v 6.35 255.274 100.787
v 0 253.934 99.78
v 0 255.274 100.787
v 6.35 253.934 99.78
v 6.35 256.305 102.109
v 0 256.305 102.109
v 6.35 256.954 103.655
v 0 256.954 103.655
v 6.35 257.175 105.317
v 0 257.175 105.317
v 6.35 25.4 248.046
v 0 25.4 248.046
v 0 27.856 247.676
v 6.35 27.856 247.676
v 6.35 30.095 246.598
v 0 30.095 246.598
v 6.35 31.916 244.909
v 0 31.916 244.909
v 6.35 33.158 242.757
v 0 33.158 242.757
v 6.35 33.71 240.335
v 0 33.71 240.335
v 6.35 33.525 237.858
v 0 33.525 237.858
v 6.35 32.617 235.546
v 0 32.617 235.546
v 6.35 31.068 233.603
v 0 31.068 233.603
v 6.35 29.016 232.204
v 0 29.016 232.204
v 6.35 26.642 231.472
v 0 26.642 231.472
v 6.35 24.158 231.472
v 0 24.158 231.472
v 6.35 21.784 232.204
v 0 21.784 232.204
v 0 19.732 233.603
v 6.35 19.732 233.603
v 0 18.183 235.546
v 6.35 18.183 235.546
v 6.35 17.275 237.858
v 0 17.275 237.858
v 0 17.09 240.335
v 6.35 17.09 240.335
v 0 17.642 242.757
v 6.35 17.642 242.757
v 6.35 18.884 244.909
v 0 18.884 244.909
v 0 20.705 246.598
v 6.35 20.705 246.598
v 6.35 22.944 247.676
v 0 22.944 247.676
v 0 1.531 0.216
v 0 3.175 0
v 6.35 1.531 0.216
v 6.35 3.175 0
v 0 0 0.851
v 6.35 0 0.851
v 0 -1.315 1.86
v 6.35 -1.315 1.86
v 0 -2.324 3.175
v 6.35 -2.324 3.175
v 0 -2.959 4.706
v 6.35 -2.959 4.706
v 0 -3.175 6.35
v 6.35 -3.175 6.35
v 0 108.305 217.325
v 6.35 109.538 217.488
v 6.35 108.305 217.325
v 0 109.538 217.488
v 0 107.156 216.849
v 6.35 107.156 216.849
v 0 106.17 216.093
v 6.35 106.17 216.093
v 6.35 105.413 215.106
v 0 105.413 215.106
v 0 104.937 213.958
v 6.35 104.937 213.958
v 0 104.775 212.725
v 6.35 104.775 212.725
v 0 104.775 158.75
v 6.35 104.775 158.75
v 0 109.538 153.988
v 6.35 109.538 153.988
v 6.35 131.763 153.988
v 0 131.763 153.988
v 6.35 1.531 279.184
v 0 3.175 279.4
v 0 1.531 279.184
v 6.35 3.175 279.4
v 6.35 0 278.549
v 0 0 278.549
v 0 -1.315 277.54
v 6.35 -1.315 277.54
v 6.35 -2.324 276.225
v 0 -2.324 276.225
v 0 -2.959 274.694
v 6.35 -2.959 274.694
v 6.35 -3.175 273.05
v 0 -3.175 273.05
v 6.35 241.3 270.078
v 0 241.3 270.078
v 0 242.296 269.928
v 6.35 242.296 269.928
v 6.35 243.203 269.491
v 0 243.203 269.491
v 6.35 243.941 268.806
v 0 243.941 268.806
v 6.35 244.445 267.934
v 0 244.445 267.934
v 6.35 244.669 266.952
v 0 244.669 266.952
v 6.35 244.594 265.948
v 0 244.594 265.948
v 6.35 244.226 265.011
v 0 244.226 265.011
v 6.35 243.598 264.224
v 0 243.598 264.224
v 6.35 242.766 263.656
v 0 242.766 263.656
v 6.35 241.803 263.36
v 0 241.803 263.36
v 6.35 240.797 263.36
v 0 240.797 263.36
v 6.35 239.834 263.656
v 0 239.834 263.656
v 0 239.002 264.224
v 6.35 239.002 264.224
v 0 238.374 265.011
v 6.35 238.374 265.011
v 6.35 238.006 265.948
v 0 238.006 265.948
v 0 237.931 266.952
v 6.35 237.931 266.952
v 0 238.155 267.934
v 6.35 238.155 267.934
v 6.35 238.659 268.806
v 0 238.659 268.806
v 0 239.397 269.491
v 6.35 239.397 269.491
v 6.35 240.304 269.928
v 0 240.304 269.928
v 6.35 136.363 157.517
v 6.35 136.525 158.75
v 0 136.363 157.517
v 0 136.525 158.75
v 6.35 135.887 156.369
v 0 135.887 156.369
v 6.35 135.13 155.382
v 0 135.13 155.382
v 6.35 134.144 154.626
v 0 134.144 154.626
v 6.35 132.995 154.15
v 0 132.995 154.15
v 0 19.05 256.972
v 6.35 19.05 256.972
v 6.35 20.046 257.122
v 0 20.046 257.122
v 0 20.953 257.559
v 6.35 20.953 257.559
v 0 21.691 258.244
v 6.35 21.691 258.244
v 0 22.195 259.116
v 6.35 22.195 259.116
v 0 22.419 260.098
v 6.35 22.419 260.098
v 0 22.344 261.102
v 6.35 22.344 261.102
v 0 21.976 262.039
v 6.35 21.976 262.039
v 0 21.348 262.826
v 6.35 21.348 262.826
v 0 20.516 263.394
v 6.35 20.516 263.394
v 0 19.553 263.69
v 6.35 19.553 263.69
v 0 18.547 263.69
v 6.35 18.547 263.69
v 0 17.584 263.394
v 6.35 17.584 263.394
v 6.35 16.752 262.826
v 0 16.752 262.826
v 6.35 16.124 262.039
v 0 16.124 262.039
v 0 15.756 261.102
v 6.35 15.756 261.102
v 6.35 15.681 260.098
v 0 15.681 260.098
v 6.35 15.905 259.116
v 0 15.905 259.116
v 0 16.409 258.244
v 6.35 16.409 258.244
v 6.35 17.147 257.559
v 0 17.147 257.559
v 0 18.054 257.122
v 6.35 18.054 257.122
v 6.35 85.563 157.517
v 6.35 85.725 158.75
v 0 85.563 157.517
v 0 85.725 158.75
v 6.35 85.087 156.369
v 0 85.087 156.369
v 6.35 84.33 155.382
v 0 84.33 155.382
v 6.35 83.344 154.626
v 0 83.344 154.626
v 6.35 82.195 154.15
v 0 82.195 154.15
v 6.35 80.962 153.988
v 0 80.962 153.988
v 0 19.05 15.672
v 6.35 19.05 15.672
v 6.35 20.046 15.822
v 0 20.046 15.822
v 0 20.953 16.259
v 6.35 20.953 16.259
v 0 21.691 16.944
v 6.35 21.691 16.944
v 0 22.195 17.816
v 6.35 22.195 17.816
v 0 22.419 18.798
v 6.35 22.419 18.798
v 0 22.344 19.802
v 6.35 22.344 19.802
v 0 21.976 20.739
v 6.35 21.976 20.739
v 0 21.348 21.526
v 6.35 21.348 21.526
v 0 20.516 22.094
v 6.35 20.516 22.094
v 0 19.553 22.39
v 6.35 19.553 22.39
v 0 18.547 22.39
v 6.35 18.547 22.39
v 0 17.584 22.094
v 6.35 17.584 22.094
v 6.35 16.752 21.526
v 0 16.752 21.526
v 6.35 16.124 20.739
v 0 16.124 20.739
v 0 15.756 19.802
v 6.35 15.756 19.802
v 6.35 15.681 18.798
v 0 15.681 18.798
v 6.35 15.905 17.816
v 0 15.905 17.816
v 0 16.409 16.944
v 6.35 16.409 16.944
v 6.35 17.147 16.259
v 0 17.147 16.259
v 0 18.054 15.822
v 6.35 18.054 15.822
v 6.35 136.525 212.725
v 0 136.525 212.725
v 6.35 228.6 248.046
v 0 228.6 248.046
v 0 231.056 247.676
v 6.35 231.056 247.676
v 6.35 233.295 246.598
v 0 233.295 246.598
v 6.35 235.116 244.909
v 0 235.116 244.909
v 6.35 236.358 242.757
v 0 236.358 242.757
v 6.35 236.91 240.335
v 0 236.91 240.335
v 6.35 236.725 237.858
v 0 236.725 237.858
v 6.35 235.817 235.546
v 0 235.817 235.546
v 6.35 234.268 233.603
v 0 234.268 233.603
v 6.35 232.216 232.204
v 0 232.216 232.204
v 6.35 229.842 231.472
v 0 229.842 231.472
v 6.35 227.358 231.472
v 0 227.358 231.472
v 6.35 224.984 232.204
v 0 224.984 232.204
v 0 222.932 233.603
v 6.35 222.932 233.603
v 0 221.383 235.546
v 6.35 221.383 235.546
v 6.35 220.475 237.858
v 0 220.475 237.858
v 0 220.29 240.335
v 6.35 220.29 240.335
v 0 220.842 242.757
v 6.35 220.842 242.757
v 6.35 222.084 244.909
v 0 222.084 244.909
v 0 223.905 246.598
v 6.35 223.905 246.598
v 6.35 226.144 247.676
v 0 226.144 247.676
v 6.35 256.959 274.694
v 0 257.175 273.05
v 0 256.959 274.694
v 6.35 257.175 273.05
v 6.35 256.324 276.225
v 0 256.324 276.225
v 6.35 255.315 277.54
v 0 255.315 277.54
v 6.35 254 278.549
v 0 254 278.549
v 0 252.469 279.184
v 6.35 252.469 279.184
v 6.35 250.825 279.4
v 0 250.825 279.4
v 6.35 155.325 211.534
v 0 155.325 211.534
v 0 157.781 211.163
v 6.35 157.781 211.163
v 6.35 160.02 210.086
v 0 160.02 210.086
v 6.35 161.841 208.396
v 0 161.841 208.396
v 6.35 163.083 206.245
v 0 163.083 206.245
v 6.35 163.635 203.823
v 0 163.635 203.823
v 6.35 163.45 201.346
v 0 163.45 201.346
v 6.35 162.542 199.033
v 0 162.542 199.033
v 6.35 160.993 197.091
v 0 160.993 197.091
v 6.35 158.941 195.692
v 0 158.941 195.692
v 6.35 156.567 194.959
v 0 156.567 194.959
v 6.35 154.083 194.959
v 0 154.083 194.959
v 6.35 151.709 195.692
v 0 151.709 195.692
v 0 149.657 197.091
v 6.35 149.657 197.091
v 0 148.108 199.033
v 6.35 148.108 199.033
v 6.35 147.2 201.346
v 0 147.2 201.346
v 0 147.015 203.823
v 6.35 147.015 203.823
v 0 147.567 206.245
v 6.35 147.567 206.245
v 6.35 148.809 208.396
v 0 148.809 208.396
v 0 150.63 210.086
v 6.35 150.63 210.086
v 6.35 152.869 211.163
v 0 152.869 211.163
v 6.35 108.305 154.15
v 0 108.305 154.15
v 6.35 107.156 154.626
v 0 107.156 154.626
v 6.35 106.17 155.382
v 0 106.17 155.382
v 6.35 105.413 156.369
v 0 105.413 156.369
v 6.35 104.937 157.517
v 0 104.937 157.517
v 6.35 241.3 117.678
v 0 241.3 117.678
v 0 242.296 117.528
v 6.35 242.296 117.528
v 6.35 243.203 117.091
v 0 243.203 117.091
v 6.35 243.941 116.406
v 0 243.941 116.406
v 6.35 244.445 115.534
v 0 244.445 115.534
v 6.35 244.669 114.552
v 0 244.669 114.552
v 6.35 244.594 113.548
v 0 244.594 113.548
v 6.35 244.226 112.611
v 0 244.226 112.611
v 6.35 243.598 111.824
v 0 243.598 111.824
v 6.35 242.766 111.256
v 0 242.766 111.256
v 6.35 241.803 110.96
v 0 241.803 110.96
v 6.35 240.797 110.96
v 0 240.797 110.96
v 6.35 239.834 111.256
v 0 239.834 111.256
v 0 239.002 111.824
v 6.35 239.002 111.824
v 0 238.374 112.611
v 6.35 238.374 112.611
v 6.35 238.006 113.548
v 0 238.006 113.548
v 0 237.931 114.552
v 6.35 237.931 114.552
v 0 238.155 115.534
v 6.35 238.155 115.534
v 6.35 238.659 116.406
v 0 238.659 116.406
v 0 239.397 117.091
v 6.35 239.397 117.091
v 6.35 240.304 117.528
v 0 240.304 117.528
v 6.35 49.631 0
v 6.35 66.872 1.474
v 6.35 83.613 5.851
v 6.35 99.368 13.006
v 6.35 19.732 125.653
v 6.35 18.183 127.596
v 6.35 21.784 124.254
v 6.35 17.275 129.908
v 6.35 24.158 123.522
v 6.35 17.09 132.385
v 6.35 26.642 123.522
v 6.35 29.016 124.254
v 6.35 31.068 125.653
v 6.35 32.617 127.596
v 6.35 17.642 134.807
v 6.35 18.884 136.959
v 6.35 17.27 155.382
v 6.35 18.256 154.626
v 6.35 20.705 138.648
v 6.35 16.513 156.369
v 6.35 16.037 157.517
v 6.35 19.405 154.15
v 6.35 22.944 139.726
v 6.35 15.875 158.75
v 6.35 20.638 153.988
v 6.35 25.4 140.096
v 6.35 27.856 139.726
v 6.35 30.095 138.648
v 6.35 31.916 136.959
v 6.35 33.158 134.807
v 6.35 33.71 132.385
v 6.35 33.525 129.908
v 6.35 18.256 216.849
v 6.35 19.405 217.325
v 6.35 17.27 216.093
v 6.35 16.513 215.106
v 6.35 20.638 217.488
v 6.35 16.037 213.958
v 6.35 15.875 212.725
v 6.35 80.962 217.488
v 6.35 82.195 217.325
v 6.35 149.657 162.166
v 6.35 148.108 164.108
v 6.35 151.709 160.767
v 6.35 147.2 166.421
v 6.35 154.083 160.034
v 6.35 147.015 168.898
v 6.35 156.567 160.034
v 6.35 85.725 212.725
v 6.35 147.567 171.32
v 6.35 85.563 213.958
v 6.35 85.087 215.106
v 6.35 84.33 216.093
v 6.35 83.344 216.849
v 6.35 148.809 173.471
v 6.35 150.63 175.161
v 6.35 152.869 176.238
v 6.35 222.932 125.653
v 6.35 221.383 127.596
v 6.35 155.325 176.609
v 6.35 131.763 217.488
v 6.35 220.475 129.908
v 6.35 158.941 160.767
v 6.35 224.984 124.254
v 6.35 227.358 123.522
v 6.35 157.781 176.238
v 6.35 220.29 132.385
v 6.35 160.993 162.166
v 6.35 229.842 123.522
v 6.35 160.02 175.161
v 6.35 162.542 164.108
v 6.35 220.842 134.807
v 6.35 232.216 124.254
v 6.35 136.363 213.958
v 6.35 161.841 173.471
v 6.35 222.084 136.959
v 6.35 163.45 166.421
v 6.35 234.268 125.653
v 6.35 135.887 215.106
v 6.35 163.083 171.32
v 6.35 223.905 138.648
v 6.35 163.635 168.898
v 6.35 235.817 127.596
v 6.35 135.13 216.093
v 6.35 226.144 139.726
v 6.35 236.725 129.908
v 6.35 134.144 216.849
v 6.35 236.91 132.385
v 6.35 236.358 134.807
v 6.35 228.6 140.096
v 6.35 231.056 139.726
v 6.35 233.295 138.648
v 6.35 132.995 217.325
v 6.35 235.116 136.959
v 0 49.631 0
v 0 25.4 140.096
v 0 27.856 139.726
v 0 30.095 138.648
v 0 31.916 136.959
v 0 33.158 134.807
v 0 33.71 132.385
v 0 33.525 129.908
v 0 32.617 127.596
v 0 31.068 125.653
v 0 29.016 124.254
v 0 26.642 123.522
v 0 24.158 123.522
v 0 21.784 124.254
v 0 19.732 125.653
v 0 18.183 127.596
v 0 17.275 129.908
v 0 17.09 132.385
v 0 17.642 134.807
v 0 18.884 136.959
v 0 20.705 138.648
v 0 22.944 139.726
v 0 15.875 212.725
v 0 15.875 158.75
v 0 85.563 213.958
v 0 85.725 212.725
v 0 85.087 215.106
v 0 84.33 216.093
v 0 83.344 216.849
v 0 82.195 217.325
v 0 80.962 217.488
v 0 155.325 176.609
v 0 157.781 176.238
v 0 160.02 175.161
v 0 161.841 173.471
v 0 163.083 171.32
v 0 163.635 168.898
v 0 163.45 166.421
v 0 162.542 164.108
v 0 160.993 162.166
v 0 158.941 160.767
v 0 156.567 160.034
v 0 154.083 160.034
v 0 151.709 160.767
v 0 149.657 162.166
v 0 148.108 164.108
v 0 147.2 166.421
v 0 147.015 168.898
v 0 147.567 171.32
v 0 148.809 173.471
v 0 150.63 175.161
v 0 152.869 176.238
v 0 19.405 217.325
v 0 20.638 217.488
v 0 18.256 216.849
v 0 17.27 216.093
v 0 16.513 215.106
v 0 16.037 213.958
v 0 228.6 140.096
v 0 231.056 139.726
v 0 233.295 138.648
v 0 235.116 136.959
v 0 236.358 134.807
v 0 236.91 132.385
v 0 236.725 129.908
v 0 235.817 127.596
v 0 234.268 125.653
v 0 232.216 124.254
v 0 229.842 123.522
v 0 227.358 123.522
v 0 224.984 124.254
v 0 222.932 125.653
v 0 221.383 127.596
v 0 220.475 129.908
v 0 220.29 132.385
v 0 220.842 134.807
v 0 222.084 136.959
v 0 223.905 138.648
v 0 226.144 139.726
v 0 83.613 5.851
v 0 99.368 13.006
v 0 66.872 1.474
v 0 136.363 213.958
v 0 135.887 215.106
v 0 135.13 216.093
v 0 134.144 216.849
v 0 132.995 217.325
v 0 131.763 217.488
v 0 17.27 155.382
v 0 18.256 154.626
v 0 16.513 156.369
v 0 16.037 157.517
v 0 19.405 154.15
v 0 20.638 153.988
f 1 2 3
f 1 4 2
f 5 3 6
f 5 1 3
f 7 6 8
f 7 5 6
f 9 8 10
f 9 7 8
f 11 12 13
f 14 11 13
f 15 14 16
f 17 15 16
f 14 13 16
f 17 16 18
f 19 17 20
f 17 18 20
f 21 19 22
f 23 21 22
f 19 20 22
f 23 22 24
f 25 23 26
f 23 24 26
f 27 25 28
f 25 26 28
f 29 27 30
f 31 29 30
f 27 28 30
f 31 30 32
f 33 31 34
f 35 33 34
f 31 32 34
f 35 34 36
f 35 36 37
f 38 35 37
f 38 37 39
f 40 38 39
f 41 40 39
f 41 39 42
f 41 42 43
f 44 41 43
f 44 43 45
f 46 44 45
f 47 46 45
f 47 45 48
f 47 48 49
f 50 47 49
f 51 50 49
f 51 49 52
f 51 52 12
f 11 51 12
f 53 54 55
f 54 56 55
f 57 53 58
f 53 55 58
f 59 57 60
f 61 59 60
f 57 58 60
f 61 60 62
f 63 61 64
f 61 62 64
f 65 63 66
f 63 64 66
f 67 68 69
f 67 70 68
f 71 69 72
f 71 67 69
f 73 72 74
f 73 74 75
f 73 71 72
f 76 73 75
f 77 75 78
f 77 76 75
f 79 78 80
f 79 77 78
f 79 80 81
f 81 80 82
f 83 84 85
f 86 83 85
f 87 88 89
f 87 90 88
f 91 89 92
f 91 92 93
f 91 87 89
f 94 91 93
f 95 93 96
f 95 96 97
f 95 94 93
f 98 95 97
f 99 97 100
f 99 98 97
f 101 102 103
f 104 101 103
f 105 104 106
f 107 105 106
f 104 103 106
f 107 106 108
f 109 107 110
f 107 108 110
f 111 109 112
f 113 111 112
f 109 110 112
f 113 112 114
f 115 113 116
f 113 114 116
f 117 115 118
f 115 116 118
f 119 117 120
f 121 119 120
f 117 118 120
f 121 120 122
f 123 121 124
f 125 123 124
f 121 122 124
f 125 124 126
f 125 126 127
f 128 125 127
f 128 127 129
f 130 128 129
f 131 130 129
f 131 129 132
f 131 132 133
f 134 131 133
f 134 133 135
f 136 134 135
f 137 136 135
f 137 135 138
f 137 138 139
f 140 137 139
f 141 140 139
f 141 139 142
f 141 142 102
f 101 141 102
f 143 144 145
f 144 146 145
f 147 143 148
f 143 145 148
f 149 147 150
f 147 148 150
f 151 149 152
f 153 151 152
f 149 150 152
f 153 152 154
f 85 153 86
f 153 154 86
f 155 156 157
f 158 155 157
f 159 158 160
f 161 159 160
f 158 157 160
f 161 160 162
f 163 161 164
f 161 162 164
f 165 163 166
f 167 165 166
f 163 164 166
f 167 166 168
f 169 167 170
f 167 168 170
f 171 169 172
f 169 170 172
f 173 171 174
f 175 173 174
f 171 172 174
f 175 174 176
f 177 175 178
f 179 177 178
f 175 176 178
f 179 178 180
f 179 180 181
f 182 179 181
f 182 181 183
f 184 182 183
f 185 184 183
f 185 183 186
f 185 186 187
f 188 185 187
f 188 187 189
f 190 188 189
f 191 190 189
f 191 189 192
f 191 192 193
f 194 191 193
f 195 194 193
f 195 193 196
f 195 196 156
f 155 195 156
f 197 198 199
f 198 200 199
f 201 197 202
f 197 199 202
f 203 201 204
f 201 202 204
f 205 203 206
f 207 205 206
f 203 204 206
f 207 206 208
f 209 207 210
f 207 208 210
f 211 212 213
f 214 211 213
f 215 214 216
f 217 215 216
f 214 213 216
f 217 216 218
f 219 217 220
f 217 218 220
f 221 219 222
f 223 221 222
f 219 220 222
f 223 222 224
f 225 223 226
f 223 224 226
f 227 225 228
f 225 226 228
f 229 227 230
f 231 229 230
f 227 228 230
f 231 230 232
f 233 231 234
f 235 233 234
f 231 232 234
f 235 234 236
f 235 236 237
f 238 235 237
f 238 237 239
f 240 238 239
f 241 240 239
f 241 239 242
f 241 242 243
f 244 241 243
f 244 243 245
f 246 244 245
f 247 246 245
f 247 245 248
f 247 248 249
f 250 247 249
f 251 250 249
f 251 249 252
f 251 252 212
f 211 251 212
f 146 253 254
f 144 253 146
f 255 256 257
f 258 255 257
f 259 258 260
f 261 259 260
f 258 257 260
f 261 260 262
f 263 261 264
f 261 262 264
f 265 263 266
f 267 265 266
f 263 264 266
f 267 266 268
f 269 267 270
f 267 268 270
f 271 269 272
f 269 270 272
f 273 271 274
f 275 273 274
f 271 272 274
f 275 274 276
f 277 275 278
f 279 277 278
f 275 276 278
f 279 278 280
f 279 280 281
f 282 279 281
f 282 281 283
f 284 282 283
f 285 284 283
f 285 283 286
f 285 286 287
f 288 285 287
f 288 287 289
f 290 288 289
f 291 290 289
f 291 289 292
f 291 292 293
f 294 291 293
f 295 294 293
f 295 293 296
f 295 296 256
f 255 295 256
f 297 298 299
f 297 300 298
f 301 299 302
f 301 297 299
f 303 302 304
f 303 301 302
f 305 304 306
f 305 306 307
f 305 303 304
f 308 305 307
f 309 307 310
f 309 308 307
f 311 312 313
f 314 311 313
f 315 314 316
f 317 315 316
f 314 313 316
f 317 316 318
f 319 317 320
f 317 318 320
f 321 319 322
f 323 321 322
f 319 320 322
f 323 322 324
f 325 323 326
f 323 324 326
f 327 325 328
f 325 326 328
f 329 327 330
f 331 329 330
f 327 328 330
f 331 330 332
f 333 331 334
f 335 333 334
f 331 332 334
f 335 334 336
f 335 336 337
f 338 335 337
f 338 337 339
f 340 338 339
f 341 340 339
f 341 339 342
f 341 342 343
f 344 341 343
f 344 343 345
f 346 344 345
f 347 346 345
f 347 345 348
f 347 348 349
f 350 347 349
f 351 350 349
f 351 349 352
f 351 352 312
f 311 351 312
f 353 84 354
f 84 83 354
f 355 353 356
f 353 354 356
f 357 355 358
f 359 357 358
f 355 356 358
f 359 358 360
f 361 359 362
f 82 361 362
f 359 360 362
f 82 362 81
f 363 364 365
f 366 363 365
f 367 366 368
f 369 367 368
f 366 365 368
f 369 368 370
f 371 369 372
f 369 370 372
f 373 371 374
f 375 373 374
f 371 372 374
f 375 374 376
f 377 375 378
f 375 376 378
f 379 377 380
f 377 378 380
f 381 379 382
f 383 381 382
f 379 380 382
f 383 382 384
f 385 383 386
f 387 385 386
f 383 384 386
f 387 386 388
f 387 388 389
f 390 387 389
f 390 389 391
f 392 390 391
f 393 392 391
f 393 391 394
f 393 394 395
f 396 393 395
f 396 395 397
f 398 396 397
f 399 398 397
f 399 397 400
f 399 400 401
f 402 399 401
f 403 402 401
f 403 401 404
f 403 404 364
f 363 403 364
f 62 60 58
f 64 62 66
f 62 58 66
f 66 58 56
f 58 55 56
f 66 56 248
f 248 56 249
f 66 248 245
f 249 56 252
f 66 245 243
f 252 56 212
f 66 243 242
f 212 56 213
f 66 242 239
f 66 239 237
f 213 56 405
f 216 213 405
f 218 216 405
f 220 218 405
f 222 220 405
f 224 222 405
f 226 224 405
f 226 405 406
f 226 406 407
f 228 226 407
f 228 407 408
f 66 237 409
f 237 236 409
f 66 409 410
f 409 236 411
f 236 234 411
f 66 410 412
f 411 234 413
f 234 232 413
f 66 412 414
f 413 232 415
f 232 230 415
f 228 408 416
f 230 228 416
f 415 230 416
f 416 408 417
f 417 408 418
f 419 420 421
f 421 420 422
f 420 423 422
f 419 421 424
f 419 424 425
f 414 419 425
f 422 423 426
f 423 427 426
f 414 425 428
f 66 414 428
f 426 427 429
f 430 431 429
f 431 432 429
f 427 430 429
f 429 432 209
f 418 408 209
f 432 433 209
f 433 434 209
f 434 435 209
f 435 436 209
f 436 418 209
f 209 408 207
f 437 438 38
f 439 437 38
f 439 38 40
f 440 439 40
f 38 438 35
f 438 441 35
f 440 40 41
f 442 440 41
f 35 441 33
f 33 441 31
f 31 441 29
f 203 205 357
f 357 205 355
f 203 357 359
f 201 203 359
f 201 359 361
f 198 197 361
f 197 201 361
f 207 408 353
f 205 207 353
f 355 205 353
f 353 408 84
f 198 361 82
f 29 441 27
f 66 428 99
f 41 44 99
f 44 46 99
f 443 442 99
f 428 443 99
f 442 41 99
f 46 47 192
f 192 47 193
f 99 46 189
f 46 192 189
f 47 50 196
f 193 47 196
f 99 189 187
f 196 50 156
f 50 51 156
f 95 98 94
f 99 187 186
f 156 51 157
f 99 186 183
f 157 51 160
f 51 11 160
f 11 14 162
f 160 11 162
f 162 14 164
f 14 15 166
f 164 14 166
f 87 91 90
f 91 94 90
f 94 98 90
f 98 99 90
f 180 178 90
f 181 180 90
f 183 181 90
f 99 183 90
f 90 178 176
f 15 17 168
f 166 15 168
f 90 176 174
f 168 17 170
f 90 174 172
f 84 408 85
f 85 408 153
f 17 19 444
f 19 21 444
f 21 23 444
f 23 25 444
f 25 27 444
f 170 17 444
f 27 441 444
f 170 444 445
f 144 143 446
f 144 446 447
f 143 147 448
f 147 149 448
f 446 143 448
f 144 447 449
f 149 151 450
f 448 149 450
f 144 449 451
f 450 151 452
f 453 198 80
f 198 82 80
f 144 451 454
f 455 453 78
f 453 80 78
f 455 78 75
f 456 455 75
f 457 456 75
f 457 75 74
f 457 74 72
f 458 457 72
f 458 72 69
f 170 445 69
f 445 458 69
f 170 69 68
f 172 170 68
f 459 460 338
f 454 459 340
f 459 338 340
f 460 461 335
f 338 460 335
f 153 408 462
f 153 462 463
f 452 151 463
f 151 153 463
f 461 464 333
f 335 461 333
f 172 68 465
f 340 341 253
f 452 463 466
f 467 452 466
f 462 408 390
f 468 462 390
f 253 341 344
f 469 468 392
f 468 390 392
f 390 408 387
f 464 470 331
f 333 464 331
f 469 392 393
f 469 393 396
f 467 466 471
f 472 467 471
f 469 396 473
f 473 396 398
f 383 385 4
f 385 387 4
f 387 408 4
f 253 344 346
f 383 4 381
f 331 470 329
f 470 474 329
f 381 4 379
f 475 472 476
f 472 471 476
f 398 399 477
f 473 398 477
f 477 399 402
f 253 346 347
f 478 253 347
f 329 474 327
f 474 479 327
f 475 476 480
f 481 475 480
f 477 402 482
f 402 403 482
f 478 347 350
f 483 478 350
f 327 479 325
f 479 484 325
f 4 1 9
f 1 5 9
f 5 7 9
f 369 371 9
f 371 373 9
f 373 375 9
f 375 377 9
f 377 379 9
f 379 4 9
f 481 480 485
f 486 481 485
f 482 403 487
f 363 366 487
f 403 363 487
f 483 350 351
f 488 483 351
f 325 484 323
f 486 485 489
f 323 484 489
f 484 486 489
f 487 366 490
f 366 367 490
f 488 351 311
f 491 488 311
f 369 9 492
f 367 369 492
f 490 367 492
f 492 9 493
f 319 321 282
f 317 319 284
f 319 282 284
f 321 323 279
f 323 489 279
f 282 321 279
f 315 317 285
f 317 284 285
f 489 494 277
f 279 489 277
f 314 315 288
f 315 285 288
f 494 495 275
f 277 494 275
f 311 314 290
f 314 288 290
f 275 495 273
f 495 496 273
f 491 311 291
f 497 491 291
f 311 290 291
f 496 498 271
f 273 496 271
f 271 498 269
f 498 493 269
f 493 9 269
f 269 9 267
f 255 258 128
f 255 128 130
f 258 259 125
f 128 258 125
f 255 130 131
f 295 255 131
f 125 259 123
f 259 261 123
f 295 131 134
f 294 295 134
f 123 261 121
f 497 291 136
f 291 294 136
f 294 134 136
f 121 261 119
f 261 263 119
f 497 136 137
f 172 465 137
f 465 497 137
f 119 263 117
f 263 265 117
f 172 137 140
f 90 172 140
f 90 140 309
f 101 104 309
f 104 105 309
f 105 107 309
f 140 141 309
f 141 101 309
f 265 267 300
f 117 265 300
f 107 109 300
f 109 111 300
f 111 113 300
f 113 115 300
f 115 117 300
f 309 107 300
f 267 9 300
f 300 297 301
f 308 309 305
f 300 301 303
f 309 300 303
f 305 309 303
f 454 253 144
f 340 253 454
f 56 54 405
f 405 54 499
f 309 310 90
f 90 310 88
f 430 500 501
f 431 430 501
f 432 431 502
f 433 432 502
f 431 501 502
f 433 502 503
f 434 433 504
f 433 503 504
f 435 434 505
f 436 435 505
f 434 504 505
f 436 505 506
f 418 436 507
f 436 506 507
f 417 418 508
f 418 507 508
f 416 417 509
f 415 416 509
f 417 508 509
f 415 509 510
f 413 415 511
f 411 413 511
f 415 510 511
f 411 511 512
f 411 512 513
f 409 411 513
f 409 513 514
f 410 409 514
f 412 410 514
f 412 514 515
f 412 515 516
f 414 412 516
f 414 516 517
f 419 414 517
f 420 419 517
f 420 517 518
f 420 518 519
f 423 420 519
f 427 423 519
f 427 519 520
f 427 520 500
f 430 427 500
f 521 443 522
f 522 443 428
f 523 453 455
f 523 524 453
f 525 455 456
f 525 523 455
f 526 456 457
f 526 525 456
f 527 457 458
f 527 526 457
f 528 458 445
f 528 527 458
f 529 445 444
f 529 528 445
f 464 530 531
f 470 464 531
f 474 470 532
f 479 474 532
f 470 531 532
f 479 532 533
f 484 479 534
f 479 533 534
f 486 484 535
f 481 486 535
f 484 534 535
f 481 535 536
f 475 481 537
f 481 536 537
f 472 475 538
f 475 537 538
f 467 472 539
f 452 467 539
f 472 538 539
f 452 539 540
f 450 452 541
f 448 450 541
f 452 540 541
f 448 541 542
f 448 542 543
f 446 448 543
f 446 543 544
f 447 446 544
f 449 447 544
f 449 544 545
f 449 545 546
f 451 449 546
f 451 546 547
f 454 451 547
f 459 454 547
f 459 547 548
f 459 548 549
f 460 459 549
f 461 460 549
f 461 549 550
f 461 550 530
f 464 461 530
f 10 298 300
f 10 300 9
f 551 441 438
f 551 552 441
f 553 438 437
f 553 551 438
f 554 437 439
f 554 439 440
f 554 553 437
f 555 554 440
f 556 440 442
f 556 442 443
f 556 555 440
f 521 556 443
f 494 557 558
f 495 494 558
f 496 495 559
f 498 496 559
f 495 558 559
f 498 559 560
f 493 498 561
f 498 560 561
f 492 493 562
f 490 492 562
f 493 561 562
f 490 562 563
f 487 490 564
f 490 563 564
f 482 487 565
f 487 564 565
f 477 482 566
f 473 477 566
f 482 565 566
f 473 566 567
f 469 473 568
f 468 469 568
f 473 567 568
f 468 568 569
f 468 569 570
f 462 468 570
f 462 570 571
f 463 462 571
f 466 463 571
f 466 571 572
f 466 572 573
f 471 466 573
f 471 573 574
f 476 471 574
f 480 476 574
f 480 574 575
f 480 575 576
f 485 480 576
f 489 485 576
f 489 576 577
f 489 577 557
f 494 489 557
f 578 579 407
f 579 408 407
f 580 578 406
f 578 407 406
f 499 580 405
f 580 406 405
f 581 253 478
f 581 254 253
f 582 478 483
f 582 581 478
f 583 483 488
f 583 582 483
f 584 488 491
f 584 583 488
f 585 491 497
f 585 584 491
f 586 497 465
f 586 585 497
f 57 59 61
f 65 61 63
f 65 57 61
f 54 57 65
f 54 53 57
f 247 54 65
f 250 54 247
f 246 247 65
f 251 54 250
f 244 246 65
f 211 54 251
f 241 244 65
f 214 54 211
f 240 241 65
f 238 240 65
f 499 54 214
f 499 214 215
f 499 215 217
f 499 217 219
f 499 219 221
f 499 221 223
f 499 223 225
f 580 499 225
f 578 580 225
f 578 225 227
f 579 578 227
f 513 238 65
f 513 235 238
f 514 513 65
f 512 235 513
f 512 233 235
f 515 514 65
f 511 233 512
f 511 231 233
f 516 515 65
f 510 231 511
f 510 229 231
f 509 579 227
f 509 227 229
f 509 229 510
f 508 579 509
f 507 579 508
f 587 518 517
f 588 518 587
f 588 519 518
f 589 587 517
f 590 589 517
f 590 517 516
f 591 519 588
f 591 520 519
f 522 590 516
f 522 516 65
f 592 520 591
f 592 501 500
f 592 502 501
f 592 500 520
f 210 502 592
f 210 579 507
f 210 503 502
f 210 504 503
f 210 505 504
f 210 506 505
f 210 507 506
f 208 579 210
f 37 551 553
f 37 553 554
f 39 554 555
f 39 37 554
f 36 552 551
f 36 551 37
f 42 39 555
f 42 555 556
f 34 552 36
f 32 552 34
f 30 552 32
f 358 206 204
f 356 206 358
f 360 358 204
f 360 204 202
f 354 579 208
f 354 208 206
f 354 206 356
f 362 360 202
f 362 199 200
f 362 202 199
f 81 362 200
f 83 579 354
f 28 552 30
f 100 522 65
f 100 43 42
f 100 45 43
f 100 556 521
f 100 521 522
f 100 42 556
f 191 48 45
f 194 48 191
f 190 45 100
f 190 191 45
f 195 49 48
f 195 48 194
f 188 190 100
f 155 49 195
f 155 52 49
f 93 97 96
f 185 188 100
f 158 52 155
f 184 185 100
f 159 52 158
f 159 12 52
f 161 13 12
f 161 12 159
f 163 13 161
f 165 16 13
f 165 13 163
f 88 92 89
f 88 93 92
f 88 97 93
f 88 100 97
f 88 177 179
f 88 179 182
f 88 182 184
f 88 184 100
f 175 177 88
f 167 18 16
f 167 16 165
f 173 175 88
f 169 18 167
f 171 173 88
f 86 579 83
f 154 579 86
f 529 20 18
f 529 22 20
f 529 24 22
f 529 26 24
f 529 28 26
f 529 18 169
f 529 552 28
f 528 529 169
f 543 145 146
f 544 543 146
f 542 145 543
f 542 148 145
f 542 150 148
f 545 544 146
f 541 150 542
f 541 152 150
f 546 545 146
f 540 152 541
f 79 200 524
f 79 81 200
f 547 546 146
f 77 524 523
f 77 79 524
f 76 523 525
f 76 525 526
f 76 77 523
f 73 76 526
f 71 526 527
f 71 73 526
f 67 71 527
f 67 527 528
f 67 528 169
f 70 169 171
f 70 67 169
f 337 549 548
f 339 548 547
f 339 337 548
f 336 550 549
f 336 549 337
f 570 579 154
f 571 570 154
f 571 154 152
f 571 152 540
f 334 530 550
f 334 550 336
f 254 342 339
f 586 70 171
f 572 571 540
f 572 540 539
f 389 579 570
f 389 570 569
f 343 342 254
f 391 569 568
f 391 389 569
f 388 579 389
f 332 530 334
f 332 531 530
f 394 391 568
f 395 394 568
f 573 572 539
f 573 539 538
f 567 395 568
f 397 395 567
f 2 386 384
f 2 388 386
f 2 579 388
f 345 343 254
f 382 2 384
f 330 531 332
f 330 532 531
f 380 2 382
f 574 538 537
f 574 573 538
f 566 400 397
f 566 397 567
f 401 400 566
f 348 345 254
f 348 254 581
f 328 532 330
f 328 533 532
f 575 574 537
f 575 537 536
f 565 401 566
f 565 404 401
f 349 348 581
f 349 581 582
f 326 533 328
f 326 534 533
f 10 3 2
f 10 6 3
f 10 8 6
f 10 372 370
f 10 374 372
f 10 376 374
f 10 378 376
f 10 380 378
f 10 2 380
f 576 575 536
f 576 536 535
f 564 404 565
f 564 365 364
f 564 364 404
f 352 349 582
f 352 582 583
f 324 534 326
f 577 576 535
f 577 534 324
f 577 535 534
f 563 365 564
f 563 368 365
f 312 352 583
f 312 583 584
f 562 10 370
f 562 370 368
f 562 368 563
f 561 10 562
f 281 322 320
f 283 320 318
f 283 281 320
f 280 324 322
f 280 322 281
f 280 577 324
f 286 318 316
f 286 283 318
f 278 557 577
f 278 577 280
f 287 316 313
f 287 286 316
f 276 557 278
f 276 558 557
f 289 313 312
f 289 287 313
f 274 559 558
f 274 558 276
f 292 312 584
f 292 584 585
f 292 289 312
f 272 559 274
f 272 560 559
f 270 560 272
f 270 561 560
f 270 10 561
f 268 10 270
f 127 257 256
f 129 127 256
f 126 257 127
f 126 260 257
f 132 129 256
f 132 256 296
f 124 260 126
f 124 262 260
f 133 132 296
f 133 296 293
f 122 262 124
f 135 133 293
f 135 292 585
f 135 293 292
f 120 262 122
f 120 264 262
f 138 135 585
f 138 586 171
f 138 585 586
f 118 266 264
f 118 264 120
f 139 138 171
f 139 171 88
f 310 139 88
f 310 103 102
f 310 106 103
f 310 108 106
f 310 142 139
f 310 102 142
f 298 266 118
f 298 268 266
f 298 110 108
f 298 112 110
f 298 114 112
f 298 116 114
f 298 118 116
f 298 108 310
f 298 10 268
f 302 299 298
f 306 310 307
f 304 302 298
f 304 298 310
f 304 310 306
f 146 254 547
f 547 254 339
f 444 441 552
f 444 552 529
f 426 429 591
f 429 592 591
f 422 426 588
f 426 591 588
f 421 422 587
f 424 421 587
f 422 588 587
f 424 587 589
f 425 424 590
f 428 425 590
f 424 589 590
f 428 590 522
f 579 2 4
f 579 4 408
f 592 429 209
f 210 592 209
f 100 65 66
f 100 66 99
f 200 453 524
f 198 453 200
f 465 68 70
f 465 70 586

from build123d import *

# Parameters (mm, degrees)
BOSS_EXTRUDE1_DEPTH     = 6.35
F_1_4_CLEARANCE_HOLE4_D = 6.7564
F_1_4_CLEARANCE_HOLE5_D = 6.7564
FILLET4_R               = 101.6
SKETCH22_W              = 63.5
SKETCH22_H              = 69.85
SKETCH22_H_2            = 31.75
CUT_EXTRUDE1_DEPTH      = 7.35
F_5_8_CLEARANCE_HOLE1_D = 16.66748
FILLET5_R               = 6.35
FILLET6_R               = 4.7625


with BuildPart() as part:
    # Sketch1 → Boss-Extrude1 (new body)
    with BuildSketch(Plane(origin=(0, 0, 0), x_dir=(0, 0, -1), z_dir=(1, 0, 0))):
        Polygon((-279.4, 0), (-279.4, 257.175), (-101.6, 257.175), (0, 76.2), (0, 0), (0, -3.175), (-279.4, -3.175), align=None)
    extrude(amount=BOSS_EXTRUDE1_DEPTH)

    # 1/4 Clearance Hole4 (through all)
    with Locations(Plane(origin=(6.35, 0, 0), x_dir=(0, 0, -1), z_dir=(1, 0, 0))):
        with Locations((-266.7, 241.3), (-114.3, 241.3)):
            Hole(F_1_4_CLEARANCE_HOLE4_D / 2)

    # 1/4 Clearance Hole5 (through all)
    with Locations(Plane.ZY):
        with Locations((19.05, 19.05), (260.35, 19.05)):
            Hole(F_1_4_CLEARANCE_HOLE5_D / 2)

    # Fillet4
    fillet4_edges = [part.edges().sort_by_distance(p)[0] for p in [
        (3.175, 76.2, 0),
    ]]
    fillet(fillet4_edges, radius=FILLET4_R)

    # Sketch22 → Cut-Extrude1 (cut, through all)
    with BuildSketch(Plane(origin=(6.35, 0, 0), x_dir=(0, 0, -1), z_dir=(1, 0, 0))):
        with Locations((-185.7375, 50.8)):
            Rectangle(SKETCH22_W, SKETCH22_H)
        with Locations((-185.7375, 120.65)):
            Rectangle(SKETCH22_W, SKETCH22_H_2)
    extrude(amount=-CUT_EXTRUDE1_DEPTH, mode=Mode.SUBTRACT)

    # 5/8 Clearance Hole1 (through all)
    with Locations(Plane(origin=(6.35, 0, 0), x_dir=(0, 0, -1), z_dir=(1, 0, 0))):
        with Locations((-239.7125, 228.6), (-131.7625, 228.6), (-239.7125, 25.4), (-131.7625, 25.4), (-203.2, 155.324999992), (-168.275, 155.324999992)):
            Hole(F_5_8_CLEARANCE_HOLE1_D / 2)

    # Fillet5
    fillet5_edges = [part.edges().sort_by_distance(p)[0] for p in [
        (3.175, -3.175, 0),
        (3.175, -3.175, 279.4),
        (3.175, 257.175, 279.4),
        (3.175, 257.175, 101.6),
    ]]
    fillet(fillet5_edges, radius=FILLET5_R)

    # Fillet6
    fillet6_edges = [part.edges().sort_by_distance(p)[0] for p in [
        (3.175, 15.875, 217.4875),
        (3.175, 85.725, 217.4875),
        (3.175, 85.725, 153.9875),
        (3.175, 15.875, 153.9875),
        (3.175, 104.775, 217.4875),
        (3.175, 136.525, 217.4875),
        (3.175, 136.525, 153.9875),
        (3.175, 104.775, 153.9875),
    ]]
    fillet(fillet6_edges, radius=FILLET6_R)


solid = part.part
